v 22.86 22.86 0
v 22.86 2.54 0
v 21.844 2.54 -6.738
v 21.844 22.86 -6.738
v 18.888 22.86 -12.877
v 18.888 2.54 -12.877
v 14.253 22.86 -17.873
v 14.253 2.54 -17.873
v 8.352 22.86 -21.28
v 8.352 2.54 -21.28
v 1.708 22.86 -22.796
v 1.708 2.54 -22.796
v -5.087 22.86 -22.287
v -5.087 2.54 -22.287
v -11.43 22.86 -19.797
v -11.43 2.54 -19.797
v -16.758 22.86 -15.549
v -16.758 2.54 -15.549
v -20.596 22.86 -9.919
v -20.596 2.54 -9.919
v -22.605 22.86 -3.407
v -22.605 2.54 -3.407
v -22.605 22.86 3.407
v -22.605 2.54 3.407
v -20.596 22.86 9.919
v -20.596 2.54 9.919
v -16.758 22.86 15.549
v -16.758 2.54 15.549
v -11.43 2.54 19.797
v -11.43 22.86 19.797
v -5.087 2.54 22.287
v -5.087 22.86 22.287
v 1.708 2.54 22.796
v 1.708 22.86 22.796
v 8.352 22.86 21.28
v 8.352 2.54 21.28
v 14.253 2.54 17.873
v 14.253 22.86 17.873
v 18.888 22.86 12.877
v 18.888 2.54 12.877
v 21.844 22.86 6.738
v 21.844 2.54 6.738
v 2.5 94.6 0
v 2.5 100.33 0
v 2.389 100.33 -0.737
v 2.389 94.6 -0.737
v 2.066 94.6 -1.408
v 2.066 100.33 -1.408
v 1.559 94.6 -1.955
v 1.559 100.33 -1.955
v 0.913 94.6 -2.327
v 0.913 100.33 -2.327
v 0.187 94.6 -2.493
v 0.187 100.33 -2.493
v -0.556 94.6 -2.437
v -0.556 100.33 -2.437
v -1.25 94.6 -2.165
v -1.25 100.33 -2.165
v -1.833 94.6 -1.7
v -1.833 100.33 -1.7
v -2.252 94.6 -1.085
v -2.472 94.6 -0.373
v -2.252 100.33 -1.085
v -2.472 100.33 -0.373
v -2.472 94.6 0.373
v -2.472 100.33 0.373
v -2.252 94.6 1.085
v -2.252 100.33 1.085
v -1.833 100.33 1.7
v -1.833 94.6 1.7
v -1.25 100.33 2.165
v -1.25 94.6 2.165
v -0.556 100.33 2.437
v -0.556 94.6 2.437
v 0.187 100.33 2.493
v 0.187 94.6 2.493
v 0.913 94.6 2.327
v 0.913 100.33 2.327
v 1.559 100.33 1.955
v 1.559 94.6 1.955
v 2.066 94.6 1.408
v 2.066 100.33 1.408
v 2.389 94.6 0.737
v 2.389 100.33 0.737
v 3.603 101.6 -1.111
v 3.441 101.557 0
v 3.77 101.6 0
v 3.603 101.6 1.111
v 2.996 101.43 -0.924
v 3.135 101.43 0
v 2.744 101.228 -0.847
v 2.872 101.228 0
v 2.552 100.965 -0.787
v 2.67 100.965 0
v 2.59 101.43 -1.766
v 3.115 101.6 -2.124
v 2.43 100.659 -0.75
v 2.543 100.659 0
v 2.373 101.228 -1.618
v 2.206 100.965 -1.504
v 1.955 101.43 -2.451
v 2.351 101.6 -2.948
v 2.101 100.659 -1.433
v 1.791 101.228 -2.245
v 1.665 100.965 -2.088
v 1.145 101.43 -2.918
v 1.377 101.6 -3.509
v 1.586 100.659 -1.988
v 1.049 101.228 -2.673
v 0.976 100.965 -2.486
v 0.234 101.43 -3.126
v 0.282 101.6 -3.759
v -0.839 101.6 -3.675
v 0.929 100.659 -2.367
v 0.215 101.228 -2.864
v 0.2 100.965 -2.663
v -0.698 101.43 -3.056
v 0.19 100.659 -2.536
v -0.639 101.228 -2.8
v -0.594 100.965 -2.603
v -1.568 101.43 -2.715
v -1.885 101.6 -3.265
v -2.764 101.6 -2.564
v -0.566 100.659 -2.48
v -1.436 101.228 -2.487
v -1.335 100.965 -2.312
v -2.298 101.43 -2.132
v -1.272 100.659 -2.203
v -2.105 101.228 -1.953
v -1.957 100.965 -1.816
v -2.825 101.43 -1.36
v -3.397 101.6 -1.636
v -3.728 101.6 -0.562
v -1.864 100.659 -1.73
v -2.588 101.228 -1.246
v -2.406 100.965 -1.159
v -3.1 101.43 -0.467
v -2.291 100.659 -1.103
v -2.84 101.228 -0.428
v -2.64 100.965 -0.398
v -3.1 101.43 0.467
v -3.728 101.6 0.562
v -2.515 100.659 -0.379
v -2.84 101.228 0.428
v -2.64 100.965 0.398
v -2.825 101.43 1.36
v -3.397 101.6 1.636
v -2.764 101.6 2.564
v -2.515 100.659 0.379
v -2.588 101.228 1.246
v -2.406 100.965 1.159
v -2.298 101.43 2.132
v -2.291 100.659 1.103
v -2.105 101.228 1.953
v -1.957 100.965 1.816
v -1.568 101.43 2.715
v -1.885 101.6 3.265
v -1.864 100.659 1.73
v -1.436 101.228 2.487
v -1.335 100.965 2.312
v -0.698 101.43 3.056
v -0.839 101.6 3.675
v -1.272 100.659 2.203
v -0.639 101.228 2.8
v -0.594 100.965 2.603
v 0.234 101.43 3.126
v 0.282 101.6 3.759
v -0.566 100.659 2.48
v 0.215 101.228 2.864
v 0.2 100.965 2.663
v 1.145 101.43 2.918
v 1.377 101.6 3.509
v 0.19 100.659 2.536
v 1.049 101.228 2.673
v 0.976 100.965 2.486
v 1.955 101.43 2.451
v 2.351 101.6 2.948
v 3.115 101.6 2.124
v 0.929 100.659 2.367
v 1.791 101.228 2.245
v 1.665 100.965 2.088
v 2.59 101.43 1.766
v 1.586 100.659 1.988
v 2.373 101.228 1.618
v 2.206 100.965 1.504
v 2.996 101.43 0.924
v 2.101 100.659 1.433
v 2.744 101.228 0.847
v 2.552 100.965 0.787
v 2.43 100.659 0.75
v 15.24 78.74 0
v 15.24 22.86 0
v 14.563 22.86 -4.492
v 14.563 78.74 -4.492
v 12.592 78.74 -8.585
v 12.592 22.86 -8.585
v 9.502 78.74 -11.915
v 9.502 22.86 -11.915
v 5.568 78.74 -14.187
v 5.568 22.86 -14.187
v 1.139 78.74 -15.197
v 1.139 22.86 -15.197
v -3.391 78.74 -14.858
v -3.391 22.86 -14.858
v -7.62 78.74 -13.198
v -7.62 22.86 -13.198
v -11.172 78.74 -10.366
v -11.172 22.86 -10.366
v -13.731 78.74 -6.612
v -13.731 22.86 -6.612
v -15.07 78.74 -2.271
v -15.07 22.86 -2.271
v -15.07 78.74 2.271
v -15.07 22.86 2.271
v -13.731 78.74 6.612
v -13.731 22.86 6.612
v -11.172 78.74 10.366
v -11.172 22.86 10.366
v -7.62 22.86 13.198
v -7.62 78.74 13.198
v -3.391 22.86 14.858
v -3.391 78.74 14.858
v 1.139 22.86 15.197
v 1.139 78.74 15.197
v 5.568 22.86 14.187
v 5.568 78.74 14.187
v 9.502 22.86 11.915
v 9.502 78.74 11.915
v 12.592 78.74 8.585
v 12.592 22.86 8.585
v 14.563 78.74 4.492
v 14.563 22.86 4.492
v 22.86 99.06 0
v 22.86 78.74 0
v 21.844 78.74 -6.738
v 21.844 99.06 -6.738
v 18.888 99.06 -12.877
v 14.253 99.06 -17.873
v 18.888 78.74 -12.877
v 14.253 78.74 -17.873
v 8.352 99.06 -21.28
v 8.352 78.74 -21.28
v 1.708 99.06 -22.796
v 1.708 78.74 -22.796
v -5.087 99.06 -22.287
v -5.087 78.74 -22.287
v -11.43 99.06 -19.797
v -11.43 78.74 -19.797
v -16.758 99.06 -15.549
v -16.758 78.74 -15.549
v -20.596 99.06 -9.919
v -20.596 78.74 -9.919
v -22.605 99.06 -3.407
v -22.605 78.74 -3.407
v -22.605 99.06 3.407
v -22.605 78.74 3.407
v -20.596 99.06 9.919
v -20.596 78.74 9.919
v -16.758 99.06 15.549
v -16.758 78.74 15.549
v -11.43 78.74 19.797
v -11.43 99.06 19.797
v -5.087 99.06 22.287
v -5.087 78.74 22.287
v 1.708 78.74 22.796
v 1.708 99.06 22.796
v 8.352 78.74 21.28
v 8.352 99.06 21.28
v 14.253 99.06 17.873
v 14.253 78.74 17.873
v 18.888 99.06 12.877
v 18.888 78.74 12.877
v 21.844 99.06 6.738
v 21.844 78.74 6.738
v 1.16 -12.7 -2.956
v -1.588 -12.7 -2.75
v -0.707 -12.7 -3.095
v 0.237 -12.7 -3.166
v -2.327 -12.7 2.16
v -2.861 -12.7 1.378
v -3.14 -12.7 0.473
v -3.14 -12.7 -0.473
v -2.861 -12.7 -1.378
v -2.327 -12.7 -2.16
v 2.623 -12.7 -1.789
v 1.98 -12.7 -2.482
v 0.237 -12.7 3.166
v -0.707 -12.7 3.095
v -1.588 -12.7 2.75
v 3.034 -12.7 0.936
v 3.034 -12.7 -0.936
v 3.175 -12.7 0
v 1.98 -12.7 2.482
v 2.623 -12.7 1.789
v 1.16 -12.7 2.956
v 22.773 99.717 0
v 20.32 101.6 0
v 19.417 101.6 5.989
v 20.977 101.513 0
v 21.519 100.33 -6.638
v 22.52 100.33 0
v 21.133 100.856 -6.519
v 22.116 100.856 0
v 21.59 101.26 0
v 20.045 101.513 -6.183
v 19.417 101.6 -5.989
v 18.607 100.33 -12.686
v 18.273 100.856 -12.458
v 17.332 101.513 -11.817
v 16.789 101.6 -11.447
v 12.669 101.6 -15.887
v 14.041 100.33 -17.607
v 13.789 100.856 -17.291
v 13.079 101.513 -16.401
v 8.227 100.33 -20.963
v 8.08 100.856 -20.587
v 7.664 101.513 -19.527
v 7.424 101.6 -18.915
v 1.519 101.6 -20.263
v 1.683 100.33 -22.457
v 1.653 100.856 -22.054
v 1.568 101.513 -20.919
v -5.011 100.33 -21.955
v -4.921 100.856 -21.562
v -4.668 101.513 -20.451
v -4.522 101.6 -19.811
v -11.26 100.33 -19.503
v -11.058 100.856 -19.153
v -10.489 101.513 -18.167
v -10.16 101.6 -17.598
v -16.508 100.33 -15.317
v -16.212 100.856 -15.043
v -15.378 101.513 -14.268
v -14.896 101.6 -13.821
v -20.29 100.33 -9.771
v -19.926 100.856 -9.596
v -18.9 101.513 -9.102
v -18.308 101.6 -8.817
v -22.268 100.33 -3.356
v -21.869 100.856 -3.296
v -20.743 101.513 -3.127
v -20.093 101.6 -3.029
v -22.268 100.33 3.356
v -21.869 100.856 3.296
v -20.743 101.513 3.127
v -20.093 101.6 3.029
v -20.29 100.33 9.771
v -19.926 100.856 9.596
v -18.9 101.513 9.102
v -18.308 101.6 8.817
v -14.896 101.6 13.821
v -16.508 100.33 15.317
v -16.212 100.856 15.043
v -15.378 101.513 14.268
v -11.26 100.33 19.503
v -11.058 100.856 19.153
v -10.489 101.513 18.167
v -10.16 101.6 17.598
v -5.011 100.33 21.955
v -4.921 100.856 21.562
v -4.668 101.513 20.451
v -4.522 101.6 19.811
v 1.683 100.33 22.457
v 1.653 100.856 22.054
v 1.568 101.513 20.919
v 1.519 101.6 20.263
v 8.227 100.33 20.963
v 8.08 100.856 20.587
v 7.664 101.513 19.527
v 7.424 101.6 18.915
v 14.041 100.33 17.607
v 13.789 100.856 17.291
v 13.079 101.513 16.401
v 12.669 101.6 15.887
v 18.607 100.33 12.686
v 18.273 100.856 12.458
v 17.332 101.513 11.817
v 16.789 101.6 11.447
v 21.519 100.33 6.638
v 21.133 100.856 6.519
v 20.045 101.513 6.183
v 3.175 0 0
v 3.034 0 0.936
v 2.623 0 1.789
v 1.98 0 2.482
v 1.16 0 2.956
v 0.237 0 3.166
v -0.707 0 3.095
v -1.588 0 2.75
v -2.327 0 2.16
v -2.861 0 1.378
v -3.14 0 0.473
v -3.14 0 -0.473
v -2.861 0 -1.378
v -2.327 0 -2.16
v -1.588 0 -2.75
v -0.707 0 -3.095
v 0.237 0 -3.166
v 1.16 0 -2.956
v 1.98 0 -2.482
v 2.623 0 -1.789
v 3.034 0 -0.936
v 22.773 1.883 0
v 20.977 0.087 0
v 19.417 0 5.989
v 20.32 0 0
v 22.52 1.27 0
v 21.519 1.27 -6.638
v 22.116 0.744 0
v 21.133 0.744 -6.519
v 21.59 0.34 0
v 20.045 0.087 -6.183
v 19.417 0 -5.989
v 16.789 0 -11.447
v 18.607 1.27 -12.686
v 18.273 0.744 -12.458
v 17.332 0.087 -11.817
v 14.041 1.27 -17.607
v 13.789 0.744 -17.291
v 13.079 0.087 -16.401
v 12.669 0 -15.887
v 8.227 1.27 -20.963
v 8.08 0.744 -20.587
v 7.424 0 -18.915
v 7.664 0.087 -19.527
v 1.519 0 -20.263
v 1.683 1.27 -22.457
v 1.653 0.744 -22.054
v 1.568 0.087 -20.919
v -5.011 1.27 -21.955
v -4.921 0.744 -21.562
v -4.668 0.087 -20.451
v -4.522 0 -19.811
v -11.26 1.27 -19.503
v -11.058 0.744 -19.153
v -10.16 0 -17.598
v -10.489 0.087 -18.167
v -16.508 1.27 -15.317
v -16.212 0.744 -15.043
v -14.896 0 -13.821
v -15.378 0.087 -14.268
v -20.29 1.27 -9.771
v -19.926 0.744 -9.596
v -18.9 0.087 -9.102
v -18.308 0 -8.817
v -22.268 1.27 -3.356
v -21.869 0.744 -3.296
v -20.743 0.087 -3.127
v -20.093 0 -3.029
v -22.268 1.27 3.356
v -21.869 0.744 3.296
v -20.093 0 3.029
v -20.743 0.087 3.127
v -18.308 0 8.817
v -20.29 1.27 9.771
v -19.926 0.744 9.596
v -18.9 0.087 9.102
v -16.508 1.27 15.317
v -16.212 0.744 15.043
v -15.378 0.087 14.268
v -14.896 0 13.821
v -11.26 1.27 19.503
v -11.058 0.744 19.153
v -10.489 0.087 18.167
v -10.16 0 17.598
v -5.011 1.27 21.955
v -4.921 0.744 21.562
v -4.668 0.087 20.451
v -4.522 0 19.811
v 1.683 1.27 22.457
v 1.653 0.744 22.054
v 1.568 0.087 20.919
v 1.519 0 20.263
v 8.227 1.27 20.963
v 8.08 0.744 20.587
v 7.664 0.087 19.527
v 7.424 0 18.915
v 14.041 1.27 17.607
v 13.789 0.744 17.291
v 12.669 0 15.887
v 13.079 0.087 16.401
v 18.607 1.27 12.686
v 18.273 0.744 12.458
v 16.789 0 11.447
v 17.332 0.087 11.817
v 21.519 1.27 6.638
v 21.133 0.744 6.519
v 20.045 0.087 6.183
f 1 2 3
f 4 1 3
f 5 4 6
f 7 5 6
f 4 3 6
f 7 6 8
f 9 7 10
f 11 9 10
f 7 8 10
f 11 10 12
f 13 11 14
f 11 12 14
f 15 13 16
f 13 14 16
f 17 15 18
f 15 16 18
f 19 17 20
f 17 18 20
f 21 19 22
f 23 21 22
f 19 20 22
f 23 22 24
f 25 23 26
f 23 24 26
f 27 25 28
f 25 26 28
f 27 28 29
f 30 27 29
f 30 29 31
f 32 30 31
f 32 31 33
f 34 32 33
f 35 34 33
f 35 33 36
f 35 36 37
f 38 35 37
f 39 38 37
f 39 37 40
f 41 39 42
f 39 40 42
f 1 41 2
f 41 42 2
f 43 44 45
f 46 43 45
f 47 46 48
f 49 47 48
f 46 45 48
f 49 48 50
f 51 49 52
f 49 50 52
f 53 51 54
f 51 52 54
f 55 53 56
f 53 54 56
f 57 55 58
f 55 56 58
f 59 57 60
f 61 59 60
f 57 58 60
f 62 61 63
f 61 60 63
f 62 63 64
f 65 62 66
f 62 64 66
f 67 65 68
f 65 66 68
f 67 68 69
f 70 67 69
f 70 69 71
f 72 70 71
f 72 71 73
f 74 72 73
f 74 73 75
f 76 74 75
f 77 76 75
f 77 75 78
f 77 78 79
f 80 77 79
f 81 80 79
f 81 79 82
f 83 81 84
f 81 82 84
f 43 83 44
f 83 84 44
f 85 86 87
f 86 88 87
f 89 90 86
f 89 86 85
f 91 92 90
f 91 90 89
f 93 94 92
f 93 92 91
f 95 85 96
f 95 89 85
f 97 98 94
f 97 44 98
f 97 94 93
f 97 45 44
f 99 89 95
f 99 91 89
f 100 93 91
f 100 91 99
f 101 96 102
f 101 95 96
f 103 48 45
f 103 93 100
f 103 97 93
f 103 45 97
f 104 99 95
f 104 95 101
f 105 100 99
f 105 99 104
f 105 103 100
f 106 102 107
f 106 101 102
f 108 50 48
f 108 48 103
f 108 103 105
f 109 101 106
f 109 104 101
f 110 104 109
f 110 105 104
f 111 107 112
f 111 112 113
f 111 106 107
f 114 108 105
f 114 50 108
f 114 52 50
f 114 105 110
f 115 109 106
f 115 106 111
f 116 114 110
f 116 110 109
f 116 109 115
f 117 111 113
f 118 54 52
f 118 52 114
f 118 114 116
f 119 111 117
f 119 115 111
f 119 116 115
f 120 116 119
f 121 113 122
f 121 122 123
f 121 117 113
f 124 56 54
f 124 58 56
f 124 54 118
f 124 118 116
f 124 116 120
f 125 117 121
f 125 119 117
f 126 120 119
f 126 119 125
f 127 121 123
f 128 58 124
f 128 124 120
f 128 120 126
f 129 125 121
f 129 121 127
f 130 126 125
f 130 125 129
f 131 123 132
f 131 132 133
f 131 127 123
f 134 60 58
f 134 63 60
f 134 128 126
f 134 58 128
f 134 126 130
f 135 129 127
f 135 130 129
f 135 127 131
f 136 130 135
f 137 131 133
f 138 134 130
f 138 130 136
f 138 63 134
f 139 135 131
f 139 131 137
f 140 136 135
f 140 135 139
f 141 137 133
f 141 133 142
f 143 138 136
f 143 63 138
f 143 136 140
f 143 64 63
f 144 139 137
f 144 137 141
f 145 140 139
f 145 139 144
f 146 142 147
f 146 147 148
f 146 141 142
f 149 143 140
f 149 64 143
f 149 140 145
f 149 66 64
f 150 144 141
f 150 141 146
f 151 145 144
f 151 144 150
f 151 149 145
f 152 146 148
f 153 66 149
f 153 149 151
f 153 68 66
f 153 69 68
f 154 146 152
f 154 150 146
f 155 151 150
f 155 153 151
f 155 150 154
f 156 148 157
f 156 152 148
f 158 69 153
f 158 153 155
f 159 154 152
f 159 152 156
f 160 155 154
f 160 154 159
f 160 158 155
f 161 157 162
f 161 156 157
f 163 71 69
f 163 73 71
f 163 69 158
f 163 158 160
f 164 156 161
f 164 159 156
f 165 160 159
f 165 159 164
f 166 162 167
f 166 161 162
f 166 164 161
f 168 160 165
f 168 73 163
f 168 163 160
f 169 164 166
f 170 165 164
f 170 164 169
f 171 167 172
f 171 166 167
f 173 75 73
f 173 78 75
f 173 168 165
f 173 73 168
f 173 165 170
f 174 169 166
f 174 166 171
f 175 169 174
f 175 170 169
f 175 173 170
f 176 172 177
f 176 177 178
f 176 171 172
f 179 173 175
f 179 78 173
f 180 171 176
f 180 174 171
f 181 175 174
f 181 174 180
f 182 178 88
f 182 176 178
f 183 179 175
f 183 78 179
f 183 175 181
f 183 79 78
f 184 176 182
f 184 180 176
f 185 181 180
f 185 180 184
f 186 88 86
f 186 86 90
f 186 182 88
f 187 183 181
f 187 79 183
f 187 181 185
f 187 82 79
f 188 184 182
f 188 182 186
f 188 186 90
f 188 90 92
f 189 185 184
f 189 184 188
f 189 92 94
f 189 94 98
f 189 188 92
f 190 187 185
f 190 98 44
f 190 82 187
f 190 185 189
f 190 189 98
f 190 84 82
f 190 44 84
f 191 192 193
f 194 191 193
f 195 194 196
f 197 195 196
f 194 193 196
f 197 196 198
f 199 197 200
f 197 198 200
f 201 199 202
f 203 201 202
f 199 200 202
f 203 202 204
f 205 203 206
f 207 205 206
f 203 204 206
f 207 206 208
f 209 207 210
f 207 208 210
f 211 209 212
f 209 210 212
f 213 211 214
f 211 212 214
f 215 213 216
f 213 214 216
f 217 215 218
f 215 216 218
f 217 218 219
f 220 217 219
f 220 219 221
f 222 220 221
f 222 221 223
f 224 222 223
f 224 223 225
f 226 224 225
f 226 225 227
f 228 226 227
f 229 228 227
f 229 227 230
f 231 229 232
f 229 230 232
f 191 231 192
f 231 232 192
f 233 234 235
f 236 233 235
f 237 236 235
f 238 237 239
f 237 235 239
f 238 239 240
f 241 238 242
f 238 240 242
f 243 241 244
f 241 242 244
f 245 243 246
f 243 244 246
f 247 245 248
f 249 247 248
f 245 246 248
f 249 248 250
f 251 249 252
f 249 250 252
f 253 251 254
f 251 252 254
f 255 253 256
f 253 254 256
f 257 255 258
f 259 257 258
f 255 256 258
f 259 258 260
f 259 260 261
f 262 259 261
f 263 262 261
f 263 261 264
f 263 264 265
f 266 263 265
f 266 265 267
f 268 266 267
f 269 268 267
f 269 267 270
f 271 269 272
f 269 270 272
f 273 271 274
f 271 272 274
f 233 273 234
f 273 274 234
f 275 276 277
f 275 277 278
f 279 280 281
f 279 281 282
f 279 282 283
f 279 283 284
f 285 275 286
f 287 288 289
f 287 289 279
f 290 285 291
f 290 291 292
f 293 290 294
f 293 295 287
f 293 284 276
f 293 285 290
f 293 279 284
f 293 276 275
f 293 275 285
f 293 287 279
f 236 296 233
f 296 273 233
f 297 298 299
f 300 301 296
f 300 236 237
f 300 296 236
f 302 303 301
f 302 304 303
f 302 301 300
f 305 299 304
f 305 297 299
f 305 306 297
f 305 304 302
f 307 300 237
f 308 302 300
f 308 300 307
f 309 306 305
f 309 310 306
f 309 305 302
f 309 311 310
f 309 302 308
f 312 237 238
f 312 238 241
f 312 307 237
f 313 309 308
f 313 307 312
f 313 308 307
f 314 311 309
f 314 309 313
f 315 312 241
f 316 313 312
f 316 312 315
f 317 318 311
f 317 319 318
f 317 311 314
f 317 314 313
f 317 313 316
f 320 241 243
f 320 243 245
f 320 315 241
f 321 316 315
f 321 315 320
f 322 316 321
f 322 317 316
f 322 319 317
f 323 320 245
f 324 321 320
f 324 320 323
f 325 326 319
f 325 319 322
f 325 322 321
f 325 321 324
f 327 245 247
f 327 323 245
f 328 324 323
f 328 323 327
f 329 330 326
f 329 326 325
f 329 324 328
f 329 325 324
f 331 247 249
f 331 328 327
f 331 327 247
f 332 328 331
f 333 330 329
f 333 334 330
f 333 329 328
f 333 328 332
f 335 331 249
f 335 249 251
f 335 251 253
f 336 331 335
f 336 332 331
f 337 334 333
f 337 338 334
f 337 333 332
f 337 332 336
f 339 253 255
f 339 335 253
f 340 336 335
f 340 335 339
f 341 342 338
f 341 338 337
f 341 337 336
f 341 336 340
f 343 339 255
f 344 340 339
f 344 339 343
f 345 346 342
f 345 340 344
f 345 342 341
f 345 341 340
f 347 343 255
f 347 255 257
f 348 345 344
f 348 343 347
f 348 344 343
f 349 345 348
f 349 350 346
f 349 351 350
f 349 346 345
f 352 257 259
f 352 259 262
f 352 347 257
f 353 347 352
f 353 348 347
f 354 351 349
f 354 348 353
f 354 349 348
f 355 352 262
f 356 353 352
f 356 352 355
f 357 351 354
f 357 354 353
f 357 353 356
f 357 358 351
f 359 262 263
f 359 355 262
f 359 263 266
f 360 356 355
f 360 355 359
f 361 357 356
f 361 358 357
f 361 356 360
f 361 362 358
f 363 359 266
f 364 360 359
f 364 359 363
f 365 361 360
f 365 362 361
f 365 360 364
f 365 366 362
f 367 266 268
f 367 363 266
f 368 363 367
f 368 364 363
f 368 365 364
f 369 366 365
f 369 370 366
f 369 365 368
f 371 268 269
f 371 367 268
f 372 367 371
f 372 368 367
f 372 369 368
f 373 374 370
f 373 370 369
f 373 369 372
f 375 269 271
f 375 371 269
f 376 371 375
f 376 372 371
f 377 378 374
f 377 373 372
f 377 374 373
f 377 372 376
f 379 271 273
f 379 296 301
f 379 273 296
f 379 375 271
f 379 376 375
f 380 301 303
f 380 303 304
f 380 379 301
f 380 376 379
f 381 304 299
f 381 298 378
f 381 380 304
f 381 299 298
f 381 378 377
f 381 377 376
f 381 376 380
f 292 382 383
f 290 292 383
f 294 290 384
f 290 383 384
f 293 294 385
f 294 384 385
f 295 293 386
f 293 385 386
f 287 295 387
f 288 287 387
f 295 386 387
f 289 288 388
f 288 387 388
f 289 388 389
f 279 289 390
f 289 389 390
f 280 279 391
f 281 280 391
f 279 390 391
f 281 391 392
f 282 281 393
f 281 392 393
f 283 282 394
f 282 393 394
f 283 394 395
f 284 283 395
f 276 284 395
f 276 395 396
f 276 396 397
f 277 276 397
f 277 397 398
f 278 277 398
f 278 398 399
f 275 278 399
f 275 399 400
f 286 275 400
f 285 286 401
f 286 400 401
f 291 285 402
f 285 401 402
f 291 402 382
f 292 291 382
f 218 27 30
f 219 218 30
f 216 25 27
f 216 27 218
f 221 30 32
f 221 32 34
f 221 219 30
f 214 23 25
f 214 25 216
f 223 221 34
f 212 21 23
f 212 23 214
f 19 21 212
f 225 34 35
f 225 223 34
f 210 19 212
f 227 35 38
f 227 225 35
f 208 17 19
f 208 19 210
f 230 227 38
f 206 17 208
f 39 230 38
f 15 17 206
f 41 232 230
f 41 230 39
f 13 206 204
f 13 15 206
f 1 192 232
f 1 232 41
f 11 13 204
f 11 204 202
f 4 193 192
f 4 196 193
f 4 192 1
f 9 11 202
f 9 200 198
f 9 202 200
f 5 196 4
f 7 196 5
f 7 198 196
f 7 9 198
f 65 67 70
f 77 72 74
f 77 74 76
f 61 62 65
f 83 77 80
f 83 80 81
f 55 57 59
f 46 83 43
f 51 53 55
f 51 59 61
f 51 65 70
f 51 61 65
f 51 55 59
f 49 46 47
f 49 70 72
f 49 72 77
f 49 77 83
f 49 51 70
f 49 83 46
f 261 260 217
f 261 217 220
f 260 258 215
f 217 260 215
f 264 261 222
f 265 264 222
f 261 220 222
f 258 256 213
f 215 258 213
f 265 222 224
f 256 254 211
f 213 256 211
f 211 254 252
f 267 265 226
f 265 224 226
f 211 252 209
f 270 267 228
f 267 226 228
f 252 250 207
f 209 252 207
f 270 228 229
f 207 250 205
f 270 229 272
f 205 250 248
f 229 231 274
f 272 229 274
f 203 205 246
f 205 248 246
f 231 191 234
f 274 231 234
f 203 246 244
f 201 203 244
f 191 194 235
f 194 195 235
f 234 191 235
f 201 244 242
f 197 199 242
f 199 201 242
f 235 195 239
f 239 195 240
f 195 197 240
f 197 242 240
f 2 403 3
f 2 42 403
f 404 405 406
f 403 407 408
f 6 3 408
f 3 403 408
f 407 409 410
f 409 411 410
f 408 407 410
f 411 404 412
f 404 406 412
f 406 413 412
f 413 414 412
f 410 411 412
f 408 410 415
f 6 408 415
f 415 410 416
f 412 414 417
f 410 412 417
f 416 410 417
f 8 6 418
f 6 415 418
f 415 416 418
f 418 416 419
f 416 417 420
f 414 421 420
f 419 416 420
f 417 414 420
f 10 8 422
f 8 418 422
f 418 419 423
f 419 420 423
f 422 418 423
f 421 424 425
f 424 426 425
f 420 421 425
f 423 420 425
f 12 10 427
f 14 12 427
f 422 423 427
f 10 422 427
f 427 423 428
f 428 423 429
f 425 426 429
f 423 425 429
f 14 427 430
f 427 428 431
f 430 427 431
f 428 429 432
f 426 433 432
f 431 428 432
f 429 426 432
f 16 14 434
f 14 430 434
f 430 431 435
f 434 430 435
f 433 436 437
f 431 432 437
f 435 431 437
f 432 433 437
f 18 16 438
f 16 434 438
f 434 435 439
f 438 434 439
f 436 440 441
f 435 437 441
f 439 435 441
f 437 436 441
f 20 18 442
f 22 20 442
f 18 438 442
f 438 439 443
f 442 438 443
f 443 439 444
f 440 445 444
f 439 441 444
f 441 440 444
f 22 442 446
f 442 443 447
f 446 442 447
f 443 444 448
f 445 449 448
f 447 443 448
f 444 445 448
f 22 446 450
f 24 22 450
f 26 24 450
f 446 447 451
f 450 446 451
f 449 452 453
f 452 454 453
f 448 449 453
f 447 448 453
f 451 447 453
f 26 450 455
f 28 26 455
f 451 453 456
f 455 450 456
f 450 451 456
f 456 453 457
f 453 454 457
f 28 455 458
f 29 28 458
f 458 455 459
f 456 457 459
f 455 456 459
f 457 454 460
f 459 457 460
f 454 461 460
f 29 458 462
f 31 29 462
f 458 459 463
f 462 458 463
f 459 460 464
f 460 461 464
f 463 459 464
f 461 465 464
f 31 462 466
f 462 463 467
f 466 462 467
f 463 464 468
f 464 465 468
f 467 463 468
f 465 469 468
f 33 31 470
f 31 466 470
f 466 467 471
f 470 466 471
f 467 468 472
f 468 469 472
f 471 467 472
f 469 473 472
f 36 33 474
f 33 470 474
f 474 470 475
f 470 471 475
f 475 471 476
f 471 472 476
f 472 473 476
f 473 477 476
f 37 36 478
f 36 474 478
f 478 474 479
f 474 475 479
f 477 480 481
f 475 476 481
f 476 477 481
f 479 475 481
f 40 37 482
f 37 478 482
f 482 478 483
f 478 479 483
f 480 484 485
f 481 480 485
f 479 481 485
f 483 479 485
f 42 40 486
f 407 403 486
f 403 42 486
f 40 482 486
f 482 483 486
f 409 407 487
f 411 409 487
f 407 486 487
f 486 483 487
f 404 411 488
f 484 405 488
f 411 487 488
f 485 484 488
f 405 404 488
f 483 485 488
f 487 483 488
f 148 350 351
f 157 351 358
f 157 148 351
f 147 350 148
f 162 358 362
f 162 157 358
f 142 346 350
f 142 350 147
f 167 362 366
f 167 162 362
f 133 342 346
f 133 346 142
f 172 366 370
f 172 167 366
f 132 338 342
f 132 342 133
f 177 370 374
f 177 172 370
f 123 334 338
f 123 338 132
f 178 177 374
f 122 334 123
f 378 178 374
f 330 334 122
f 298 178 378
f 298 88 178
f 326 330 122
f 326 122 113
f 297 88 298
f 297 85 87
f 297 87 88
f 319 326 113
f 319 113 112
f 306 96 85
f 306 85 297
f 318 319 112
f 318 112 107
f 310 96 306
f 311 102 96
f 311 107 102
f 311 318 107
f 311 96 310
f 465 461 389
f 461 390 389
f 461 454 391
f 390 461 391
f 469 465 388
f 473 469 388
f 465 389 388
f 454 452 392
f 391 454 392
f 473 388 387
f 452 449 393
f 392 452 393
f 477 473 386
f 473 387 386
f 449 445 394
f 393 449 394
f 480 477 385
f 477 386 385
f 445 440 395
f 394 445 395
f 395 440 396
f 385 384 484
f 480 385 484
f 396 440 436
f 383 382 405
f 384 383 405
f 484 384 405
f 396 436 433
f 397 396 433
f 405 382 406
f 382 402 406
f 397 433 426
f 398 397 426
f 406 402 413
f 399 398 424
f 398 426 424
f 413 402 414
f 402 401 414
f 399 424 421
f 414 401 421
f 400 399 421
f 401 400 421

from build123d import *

# Parameters (mm, degrees)
SKETCH1_R           = 22.86
BOSS_EXTRUDE1_DEPTH = 22.86
SKETCH3_R           = 15.24
BOSS_EXTRUDE2_DEPTH = 55.88
SKETCH4_R           = 22.86
BOSS_EXTRUDE3_DEPTH = 22.86
FILLET3_R           = 2.54
SKETCH5_R           = 2.5
CUT_EXTRUDE1_DEPTH  = 7
FILLET4_R           = 1.27
SKETCH8_R           = 3.175
BOSS_EXTRUDE4_DEPTH = 12.7


with BuildPart() as part:
    # Sketch1 → Boss-Extrude1 (new body)
    with BuildSketch(Plane(origin=(0, 0, 0), x_dir=(1, 0, 0), z_dir=(0, 1, 0))):
        Circle(SKETCH1_R)
    extrude(amount=BOSS_EXTRUDE1_DEPTH)

    # Sketch3 → Boss-Extrude2 (add)
    with BuildSketch(Plane(origin=(0, 22.86, 0), x_dir=(1, 0, 0), z_dir=(0, 1, 0))):
        Circle(SKETCH3_R)
    extrude(amount=BOSS_EXTRUDE2_DEPTH)

    # Sketch4 → Boss-Extrude3 (add)
    with BuildSketch(Plane(origin=(0, 78.74, 0), x_dir=(1, 0, 0), z_dir=(0, 1, 0))):
        Circle(SKETCH4_R)
    extrude(amount=BOSS_EXTRUDE3_DEPTH)

    # Fillet3
    fillet3_edges = [part.edges().sort_by_distance(p)[0] for p in [
        (-22.86, 101.6, 0),
        (-22.86, 0, 0),
    ]]
    fillet(fillet3_edges, radius=FILLET3_R)

    # Sketch5 → Cut-Extrude1 (cut)
    with BuildSketch(Plane(origin=(0, 101.6, 0), x_dir=(1, 0, 0), z_dir=(0, 1, 0))):
        Circle(SKETCH5_R)
    extrude(amount=-CUT_EXTRUDE1_DEPTH, mode=Mode.SUBTRACT)

    # Fillet4
    fillet4_edges = [part.edges().sort_by_distance(p)[0] for p in [
        (-2.5, 101.6, 0),
    ]]
    fillet(fillet4_edges, radius=FILLET4_R)

    # Sketch8 → Boss-Extrude4 (add)
    with BuildSketch(Plane.XZ):
        Circle(SKETCH8_R)
    extrude(amount=BOSS_EXTRUDE4_DEPTH)


solid = part.part
